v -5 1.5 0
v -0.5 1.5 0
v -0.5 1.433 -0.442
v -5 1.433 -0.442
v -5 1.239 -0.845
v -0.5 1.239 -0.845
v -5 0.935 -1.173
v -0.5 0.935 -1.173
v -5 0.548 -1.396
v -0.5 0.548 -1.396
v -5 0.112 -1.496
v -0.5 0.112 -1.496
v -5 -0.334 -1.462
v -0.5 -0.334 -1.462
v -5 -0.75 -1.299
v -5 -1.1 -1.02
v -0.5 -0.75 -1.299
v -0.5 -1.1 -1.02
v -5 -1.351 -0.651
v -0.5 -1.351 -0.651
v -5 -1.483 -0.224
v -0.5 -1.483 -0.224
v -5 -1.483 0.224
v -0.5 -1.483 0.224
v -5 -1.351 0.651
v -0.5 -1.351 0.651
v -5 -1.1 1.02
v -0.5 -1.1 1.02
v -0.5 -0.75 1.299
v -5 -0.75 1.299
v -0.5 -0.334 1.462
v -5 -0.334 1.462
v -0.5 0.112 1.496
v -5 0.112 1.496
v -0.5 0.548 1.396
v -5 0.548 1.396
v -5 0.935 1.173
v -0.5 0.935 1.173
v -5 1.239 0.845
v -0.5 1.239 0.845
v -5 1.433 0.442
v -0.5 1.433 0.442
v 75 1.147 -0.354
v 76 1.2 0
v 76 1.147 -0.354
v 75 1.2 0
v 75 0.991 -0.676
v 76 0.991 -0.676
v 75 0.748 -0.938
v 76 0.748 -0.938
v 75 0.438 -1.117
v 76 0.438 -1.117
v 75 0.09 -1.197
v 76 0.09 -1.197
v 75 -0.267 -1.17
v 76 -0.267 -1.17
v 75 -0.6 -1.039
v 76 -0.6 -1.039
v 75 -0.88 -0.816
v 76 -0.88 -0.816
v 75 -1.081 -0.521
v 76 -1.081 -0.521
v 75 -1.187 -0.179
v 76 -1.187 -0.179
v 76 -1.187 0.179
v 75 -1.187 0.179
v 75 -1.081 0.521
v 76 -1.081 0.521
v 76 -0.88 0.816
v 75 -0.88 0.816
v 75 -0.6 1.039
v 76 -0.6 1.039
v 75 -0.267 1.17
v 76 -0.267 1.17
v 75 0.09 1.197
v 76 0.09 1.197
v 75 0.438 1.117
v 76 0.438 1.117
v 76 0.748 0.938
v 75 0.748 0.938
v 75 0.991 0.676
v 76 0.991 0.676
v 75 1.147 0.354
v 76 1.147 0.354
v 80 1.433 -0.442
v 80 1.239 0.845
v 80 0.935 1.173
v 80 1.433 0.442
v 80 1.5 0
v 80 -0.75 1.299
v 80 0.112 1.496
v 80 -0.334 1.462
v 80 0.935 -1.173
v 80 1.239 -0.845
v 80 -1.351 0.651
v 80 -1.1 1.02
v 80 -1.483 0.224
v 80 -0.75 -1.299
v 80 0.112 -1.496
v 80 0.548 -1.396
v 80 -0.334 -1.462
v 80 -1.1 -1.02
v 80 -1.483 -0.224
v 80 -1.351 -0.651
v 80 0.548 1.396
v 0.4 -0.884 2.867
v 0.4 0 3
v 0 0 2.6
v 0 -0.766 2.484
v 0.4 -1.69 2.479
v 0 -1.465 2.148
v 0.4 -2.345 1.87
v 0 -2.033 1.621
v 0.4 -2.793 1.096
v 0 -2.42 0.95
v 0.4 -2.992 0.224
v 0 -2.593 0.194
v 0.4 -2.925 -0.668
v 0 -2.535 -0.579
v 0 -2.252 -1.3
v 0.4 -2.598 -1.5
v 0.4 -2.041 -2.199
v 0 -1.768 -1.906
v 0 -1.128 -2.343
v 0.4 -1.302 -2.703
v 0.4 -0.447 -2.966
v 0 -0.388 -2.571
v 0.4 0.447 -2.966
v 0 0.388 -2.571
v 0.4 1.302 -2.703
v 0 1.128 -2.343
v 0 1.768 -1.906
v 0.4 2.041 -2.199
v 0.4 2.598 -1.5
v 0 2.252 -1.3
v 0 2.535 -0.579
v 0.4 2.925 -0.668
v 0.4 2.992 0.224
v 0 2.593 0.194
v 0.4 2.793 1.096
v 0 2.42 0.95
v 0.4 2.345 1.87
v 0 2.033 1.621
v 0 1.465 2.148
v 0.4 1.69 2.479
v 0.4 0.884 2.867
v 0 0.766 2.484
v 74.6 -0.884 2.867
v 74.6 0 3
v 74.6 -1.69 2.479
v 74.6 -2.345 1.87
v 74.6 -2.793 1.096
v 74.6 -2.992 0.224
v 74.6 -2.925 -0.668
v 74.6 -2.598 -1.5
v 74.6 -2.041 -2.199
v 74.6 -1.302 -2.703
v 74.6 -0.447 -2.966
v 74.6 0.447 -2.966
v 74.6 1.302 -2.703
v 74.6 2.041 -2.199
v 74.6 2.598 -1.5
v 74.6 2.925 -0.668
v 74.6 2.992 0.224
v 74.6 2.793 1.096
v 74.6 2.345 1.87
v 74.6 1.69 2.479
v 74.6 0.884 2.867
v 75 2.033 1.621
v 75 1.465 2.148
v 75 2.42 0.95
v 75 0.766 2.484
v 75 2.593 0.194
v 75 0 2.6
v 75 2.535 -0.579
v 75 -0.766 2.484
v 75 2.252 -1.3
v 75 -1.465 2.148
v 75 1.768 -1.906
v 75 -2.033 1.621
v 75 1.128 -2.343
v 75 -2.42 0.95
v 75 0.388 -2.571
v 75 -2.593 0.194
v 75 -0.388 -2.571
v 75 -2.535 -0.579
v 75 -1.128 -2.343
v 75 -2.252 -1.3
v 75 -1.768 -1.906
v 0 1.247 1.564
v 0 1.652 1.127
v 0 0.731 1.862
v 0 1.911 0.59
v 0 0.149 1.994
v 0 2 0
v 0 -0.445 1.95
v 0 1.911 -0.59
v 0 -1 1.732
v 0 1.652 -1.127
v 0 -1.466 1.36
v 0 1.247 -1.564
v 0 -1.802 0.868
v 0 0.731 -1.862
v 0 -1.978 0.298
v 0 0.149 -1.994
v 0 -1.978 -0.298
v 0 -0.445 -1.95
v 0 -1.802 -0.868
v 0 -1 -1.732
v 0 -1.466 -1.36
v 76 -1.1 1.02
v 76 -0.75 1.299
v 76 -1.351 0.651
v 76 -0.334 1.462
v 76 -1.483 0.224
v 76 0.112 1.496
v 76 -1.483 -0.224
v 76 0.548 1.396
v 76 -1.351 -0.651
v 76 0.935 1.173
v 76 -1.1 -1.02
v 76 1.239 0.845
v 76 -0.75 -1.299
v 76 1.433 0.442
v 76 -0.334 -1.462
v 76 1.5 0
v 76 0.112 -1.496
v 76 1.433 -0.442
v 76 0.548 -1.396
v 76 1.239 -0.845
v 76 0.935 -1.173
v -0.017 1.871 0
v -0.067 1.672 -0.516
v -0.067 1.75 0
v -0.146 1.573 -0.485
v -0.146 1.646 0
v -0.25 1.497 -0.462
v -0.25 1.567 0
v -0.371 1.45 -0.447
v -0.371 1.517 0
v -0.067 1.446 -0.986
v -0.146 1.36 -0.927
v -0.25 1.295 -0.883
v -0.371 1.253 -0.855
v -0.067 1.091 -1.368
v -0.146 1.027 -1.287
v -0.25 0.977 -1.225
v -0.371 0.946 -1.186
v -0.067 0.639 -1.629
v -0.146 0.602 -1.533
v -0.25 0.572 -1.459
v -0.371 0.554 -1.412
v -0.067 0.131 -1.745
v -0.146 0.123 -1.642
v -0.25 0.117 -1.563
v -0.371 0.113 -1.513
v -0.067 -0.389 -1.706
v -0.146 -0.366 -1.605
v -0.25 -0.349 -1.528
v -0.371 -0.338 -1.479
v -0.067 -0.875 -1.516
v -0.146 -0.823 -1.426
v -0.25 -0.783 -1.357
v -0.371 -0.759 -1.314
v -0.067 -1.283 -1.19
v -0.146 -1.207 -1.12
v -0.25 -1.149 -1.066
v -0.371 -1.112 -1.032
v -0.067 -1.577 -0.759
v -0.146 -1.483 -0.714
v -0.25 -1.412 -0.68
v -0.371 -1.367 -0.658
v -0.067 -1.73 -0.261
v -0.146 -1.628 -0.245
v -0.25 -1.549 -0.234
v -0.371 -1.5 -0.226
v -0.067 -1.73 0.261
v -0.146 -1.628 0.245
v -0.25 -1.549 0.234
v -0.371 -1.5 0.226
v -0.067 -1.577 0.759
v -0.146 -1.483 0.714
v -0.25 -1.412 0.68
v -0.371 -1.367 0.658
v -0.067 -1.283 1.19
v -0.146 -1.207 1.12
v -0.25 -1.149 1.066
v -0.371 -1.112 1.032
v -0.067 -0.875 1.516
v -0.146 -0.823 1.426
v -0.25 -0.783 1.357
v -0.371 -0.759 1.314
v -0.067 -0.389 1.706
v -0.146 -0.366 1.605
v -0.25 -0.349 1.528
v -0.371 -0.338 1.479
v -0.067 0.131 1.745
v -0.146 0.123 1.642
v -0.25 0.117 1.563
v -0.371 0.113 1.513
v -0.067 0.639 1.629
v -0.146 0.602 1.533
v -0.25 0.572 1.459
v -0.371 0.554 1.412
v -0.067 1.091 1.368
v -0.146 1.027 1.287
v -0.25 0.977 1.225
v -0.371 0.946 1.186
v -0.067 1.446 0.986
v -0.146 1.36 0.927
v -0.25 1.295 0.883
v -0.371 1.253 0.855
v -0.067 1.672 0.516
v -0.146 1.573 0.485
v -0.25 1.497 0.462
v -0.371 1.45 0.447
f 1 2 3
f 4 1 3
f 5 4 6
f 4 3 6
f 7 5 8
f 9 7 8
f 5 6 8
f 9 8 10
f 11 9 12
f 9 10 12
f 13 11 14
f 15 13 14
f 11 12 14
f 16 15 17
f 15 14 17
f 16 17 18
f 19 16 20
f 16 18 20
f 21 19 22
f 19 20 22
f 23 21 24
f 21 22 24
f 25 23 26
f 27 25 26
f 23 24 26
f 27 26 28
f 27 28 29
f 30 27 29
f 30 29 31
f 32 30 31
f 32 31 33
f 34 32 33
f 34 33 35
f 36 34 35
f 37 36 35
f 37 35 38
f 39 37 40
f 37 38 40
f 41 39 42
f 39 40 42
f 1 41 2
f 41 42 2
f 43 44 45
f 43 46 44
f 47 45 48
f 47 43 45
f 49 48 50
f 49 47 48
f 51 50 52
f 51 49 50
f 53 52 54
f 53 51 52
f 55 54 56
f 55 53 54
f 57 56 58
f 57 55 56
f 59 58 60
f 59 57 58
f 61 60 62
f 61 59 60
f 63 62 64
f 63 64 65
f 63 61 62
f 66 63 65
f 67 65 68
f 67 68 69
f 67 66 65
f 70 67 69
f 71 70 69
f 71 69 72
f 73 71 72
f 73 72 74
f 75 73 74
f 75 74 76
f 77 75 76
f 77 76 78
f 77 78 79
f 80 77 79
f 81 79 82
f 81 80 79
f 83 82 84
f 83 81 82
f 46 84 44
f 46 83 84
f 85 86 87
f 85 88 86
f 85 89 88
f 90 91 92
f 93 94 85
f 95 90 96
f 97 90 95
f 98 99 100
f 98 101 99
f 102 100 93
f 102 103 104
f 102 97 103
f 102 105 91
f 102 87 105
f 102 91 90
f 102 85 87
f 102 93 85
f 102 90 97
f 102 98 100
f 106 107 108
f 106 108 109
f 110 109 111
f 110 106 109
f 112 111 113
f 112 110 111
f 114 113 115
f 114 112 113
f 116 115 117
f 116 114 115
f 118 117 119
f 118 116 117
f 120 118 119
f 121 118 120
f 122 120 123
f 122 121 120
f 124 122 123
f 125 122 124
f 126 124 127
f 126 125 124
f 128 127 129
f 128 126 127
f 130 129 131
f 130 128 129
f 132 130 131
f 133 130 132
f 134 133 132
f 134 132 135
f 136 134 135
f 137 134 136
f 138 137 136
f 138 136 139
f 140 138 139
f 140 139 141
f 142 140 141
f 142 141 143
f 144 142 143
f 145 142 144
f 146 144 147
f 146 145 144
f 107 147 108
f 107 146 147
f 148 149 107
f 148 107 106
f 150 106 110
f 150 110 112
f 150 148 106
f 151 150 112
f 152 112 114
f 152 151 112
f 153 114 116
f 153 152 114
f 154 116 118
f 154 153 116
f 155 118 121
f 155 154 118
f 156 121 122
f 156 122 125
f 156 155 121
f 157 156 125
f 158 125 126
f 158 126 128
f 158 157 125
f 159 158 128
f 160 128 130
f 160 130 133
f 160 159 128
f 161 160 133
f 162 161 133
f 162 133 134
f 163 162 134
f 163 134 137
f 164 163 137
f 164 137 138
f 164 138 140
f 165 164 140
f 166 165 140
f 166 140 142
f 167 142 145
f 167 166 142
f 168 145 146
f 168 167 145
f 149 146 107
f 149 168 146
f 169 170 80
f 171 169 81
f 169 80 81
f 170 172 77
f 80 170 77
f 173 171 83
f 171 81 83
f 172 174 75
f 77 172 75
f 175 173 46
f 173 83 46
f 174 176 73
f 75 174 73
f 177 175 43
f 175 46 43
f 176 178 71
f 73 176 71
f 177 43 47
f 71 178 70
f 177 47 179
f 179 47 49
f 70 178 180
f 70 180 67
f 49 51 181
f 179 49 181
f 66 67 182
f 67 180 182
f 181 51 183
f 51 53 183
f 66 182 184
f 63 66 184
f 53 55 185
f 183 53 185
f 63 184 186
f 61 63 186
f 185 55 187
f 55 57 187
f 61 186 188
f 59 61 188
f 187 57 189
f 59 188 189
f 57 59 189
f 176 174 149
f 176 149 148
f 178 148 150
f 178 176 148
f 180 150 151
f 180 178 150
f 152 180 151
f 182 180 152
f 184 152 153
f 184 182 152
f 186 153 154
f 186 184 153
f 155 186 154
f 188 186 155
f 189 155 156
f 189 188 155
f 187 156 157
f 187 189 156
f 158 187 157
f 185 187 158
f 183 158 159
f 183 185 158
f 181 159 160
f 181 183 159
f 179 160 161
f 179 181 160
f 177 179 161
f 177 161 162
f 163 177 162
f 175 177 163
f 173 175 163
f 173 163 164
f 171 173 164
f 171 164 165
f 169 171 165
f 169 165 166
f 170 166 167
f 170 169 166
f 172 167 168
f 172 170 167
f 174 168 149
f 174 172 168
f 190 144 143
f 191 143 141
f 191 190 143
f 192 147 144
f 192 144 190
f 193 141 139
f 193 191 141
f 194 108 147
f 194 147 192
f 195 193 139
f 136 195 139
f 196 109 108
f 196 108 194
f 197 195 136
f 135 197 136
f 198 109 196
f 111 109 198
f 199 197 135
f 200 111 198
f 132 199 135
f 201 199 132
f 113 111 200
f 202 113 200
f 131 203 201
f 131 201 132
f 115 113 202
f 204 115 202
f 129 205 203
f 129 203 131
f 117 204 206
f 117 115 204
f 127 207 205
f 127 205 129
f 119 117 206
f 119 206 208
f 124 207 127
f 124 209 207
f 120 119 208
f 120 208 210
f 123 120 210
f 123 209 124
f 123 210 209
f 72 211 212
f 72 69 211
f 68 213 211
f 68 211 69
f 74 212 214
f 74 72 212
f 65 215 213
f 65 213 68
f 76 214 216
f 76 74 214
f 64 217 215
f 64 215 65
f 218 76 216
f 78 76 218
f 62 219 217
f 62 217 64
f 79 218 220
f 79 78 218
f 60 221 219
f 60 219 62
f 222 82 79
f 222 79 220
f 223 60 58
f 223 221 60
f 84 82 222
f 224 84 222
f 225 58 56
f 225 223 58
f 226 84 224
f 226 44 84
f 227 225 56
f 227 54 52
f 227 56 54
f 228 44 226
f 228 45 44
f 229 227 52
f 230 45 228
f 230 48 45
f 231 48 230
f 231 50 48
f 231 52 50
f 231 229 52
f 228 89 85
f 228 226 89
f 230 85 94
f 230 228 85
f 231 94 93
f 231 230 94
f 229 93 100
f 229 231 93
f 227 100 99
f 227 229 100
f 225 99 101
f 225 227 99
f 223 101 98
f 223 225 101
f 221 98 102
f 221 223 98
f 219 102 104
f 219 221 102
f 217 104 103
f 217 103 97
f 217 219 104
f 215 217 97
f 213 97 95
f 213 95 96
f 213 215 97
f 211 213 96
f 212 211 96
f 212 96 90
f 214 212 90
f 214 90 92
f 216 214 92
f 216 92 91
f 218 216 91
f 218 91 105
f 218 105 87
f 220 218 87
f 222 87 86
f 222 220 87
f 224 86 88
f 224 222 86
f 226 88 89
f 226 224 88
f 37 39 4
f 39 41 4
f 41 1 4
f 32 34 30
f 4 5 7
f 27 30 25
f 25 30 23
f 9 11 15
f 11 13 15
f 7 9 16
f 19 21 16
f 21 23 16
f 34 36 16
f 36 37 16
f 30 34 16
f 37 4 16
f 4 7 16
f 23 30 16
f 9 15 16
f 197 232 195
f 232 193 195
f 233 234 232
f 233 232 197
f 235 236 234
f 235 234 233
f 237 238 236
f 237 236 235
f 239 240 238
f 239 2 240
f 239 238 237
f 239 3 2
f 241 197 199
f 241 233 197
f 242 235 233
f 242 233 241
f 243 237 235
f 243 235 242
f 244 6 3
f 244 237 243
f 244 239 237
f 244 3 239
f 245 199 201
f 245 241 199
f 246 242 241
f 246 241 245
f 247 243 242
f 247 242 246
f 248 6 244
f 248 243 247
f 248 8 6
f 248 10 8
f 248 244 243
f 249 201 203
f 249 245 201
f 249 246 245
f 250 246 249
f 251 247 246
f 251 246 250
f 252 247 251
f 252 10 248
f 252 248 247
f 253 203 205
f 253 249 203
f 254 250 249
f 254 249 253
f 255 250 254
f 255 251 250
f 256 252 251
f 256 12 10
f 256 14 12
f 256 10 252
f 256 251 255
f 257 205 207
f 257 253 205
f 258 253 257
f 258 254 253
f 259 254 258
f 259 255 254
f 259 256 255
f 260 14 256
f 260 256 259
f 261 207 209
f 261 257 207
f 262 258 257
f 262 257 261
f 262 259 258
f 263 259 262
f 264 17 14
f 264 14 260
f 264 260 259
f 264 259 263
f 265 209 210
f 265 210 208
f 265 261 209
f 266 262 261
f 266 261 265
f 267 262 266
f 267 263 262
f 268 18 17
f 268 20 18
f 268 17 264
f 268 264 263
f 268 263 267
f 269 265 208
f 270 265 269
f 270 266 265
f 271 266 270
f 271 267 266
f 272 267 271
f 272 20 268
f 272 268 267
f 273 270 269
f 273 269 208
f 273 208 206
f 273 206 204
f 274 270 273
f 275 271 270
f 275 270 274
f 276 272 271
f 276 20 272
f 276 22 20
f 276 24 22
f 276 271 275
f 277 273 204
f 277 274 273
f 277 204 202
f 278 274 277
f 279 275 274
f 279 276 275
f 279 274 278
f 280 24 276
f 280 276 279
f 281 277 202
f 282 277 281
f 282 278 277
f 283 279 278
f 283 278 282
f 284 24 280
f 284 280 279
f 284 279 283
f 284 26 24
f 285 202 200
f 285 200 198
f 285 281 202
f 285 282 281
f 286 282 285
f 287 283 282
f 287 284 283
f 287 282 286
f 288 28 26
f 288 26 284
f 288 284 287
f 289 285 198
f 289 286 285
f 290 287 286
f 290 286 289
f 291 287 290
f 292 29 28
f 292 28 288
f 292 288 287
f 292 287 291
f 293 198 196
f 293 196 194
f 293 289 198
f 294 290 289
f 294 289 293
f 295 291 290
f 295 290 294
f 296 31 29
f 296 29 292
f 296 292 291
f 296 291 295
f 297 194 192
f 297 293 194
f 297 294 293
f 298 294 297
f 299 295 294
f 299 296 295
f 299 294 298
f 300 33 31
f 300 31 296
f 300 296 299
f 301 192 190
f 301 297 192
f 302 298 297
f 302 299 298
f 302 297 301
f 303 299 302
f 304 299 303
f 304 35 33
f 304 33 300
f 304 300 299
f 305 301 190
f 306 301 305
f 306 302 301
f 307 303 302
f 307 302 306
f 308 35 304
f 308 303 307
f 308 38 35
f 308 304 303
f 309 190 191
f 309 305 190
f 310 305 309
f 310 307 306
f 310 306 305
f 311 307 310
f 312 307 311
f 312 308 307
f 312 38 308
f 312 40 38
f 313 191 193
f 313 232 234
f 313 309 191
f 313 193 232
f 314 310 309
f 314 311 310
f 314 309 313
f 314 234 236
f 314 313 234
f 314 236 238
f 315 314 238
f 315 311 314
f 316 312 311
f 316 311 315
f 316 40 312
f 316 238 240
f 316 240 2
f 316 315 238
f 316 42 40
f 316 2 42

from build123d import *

# Parameters (mm, degrees)
SKETCH1_W     = 75
SKETCH1_H     = 3
CHAMFER1_SIZE = 0.4
SKETCH5_W     = 5
SKETCH5_H     = 1.5
FILLET3_R     = 0.5
CHAMFER4_SIZE = 0.4


with BuildPart() as part:
    # Sketch1 → Revolve1 (revolve)
    with BuildSketch(Plane.XY, mode=Mode.PRIVATE) as revolve1_sk:
        with Locations((37.5, 1.5)):
            Rectangle(SKETCH1_W, SKETCH1_H)
    revolve(revolve1_sk.sketch.rotate(Axis((0, 0, 0), (1, 0, 0)), 90), axis=Axis((0, 0, 0), (1, 0, 0)))

    # Chamfer1
    chamfer1_edges = [part.edges().sort_by_distance(p)[0] for p in [
        (0, 0, -3),
    ]]
    chamfer(chamfer1_edges, length=CHAMFER1_SIZE)

    # Sketch5 → Revolve4 (revolve)
    with BuildSketch(Plane.XY):
        Polygon((80, 0), (80, 1.5), (76, 1.5), (76, 1.2), (75, 1.2), (75, 0), align=None)
        with Locations((-2.5, 0.75)):
            Rectangle(SKETCH5_W, SKETCH5_H)
    revolve(axis=Axis((80, 0, 0), (-1, 0, 0)))

    # Fillet3
    fillet3_edges = [part.edges().sort_by_distance(p)[0] for p in [
        (0, -1.5, 0),
    ]]
    fillet(fillet3_edges, radius=FILLET3_R)

    # Chamfer4
    chamfer4_edges = [part.edges().sort_by_distance(p)[0] for p in [
        (75, 0, -3),
    ]]
    chamfer(chamfer4_edges, length=CHAMFER4_SIZE)


solid = part.part
